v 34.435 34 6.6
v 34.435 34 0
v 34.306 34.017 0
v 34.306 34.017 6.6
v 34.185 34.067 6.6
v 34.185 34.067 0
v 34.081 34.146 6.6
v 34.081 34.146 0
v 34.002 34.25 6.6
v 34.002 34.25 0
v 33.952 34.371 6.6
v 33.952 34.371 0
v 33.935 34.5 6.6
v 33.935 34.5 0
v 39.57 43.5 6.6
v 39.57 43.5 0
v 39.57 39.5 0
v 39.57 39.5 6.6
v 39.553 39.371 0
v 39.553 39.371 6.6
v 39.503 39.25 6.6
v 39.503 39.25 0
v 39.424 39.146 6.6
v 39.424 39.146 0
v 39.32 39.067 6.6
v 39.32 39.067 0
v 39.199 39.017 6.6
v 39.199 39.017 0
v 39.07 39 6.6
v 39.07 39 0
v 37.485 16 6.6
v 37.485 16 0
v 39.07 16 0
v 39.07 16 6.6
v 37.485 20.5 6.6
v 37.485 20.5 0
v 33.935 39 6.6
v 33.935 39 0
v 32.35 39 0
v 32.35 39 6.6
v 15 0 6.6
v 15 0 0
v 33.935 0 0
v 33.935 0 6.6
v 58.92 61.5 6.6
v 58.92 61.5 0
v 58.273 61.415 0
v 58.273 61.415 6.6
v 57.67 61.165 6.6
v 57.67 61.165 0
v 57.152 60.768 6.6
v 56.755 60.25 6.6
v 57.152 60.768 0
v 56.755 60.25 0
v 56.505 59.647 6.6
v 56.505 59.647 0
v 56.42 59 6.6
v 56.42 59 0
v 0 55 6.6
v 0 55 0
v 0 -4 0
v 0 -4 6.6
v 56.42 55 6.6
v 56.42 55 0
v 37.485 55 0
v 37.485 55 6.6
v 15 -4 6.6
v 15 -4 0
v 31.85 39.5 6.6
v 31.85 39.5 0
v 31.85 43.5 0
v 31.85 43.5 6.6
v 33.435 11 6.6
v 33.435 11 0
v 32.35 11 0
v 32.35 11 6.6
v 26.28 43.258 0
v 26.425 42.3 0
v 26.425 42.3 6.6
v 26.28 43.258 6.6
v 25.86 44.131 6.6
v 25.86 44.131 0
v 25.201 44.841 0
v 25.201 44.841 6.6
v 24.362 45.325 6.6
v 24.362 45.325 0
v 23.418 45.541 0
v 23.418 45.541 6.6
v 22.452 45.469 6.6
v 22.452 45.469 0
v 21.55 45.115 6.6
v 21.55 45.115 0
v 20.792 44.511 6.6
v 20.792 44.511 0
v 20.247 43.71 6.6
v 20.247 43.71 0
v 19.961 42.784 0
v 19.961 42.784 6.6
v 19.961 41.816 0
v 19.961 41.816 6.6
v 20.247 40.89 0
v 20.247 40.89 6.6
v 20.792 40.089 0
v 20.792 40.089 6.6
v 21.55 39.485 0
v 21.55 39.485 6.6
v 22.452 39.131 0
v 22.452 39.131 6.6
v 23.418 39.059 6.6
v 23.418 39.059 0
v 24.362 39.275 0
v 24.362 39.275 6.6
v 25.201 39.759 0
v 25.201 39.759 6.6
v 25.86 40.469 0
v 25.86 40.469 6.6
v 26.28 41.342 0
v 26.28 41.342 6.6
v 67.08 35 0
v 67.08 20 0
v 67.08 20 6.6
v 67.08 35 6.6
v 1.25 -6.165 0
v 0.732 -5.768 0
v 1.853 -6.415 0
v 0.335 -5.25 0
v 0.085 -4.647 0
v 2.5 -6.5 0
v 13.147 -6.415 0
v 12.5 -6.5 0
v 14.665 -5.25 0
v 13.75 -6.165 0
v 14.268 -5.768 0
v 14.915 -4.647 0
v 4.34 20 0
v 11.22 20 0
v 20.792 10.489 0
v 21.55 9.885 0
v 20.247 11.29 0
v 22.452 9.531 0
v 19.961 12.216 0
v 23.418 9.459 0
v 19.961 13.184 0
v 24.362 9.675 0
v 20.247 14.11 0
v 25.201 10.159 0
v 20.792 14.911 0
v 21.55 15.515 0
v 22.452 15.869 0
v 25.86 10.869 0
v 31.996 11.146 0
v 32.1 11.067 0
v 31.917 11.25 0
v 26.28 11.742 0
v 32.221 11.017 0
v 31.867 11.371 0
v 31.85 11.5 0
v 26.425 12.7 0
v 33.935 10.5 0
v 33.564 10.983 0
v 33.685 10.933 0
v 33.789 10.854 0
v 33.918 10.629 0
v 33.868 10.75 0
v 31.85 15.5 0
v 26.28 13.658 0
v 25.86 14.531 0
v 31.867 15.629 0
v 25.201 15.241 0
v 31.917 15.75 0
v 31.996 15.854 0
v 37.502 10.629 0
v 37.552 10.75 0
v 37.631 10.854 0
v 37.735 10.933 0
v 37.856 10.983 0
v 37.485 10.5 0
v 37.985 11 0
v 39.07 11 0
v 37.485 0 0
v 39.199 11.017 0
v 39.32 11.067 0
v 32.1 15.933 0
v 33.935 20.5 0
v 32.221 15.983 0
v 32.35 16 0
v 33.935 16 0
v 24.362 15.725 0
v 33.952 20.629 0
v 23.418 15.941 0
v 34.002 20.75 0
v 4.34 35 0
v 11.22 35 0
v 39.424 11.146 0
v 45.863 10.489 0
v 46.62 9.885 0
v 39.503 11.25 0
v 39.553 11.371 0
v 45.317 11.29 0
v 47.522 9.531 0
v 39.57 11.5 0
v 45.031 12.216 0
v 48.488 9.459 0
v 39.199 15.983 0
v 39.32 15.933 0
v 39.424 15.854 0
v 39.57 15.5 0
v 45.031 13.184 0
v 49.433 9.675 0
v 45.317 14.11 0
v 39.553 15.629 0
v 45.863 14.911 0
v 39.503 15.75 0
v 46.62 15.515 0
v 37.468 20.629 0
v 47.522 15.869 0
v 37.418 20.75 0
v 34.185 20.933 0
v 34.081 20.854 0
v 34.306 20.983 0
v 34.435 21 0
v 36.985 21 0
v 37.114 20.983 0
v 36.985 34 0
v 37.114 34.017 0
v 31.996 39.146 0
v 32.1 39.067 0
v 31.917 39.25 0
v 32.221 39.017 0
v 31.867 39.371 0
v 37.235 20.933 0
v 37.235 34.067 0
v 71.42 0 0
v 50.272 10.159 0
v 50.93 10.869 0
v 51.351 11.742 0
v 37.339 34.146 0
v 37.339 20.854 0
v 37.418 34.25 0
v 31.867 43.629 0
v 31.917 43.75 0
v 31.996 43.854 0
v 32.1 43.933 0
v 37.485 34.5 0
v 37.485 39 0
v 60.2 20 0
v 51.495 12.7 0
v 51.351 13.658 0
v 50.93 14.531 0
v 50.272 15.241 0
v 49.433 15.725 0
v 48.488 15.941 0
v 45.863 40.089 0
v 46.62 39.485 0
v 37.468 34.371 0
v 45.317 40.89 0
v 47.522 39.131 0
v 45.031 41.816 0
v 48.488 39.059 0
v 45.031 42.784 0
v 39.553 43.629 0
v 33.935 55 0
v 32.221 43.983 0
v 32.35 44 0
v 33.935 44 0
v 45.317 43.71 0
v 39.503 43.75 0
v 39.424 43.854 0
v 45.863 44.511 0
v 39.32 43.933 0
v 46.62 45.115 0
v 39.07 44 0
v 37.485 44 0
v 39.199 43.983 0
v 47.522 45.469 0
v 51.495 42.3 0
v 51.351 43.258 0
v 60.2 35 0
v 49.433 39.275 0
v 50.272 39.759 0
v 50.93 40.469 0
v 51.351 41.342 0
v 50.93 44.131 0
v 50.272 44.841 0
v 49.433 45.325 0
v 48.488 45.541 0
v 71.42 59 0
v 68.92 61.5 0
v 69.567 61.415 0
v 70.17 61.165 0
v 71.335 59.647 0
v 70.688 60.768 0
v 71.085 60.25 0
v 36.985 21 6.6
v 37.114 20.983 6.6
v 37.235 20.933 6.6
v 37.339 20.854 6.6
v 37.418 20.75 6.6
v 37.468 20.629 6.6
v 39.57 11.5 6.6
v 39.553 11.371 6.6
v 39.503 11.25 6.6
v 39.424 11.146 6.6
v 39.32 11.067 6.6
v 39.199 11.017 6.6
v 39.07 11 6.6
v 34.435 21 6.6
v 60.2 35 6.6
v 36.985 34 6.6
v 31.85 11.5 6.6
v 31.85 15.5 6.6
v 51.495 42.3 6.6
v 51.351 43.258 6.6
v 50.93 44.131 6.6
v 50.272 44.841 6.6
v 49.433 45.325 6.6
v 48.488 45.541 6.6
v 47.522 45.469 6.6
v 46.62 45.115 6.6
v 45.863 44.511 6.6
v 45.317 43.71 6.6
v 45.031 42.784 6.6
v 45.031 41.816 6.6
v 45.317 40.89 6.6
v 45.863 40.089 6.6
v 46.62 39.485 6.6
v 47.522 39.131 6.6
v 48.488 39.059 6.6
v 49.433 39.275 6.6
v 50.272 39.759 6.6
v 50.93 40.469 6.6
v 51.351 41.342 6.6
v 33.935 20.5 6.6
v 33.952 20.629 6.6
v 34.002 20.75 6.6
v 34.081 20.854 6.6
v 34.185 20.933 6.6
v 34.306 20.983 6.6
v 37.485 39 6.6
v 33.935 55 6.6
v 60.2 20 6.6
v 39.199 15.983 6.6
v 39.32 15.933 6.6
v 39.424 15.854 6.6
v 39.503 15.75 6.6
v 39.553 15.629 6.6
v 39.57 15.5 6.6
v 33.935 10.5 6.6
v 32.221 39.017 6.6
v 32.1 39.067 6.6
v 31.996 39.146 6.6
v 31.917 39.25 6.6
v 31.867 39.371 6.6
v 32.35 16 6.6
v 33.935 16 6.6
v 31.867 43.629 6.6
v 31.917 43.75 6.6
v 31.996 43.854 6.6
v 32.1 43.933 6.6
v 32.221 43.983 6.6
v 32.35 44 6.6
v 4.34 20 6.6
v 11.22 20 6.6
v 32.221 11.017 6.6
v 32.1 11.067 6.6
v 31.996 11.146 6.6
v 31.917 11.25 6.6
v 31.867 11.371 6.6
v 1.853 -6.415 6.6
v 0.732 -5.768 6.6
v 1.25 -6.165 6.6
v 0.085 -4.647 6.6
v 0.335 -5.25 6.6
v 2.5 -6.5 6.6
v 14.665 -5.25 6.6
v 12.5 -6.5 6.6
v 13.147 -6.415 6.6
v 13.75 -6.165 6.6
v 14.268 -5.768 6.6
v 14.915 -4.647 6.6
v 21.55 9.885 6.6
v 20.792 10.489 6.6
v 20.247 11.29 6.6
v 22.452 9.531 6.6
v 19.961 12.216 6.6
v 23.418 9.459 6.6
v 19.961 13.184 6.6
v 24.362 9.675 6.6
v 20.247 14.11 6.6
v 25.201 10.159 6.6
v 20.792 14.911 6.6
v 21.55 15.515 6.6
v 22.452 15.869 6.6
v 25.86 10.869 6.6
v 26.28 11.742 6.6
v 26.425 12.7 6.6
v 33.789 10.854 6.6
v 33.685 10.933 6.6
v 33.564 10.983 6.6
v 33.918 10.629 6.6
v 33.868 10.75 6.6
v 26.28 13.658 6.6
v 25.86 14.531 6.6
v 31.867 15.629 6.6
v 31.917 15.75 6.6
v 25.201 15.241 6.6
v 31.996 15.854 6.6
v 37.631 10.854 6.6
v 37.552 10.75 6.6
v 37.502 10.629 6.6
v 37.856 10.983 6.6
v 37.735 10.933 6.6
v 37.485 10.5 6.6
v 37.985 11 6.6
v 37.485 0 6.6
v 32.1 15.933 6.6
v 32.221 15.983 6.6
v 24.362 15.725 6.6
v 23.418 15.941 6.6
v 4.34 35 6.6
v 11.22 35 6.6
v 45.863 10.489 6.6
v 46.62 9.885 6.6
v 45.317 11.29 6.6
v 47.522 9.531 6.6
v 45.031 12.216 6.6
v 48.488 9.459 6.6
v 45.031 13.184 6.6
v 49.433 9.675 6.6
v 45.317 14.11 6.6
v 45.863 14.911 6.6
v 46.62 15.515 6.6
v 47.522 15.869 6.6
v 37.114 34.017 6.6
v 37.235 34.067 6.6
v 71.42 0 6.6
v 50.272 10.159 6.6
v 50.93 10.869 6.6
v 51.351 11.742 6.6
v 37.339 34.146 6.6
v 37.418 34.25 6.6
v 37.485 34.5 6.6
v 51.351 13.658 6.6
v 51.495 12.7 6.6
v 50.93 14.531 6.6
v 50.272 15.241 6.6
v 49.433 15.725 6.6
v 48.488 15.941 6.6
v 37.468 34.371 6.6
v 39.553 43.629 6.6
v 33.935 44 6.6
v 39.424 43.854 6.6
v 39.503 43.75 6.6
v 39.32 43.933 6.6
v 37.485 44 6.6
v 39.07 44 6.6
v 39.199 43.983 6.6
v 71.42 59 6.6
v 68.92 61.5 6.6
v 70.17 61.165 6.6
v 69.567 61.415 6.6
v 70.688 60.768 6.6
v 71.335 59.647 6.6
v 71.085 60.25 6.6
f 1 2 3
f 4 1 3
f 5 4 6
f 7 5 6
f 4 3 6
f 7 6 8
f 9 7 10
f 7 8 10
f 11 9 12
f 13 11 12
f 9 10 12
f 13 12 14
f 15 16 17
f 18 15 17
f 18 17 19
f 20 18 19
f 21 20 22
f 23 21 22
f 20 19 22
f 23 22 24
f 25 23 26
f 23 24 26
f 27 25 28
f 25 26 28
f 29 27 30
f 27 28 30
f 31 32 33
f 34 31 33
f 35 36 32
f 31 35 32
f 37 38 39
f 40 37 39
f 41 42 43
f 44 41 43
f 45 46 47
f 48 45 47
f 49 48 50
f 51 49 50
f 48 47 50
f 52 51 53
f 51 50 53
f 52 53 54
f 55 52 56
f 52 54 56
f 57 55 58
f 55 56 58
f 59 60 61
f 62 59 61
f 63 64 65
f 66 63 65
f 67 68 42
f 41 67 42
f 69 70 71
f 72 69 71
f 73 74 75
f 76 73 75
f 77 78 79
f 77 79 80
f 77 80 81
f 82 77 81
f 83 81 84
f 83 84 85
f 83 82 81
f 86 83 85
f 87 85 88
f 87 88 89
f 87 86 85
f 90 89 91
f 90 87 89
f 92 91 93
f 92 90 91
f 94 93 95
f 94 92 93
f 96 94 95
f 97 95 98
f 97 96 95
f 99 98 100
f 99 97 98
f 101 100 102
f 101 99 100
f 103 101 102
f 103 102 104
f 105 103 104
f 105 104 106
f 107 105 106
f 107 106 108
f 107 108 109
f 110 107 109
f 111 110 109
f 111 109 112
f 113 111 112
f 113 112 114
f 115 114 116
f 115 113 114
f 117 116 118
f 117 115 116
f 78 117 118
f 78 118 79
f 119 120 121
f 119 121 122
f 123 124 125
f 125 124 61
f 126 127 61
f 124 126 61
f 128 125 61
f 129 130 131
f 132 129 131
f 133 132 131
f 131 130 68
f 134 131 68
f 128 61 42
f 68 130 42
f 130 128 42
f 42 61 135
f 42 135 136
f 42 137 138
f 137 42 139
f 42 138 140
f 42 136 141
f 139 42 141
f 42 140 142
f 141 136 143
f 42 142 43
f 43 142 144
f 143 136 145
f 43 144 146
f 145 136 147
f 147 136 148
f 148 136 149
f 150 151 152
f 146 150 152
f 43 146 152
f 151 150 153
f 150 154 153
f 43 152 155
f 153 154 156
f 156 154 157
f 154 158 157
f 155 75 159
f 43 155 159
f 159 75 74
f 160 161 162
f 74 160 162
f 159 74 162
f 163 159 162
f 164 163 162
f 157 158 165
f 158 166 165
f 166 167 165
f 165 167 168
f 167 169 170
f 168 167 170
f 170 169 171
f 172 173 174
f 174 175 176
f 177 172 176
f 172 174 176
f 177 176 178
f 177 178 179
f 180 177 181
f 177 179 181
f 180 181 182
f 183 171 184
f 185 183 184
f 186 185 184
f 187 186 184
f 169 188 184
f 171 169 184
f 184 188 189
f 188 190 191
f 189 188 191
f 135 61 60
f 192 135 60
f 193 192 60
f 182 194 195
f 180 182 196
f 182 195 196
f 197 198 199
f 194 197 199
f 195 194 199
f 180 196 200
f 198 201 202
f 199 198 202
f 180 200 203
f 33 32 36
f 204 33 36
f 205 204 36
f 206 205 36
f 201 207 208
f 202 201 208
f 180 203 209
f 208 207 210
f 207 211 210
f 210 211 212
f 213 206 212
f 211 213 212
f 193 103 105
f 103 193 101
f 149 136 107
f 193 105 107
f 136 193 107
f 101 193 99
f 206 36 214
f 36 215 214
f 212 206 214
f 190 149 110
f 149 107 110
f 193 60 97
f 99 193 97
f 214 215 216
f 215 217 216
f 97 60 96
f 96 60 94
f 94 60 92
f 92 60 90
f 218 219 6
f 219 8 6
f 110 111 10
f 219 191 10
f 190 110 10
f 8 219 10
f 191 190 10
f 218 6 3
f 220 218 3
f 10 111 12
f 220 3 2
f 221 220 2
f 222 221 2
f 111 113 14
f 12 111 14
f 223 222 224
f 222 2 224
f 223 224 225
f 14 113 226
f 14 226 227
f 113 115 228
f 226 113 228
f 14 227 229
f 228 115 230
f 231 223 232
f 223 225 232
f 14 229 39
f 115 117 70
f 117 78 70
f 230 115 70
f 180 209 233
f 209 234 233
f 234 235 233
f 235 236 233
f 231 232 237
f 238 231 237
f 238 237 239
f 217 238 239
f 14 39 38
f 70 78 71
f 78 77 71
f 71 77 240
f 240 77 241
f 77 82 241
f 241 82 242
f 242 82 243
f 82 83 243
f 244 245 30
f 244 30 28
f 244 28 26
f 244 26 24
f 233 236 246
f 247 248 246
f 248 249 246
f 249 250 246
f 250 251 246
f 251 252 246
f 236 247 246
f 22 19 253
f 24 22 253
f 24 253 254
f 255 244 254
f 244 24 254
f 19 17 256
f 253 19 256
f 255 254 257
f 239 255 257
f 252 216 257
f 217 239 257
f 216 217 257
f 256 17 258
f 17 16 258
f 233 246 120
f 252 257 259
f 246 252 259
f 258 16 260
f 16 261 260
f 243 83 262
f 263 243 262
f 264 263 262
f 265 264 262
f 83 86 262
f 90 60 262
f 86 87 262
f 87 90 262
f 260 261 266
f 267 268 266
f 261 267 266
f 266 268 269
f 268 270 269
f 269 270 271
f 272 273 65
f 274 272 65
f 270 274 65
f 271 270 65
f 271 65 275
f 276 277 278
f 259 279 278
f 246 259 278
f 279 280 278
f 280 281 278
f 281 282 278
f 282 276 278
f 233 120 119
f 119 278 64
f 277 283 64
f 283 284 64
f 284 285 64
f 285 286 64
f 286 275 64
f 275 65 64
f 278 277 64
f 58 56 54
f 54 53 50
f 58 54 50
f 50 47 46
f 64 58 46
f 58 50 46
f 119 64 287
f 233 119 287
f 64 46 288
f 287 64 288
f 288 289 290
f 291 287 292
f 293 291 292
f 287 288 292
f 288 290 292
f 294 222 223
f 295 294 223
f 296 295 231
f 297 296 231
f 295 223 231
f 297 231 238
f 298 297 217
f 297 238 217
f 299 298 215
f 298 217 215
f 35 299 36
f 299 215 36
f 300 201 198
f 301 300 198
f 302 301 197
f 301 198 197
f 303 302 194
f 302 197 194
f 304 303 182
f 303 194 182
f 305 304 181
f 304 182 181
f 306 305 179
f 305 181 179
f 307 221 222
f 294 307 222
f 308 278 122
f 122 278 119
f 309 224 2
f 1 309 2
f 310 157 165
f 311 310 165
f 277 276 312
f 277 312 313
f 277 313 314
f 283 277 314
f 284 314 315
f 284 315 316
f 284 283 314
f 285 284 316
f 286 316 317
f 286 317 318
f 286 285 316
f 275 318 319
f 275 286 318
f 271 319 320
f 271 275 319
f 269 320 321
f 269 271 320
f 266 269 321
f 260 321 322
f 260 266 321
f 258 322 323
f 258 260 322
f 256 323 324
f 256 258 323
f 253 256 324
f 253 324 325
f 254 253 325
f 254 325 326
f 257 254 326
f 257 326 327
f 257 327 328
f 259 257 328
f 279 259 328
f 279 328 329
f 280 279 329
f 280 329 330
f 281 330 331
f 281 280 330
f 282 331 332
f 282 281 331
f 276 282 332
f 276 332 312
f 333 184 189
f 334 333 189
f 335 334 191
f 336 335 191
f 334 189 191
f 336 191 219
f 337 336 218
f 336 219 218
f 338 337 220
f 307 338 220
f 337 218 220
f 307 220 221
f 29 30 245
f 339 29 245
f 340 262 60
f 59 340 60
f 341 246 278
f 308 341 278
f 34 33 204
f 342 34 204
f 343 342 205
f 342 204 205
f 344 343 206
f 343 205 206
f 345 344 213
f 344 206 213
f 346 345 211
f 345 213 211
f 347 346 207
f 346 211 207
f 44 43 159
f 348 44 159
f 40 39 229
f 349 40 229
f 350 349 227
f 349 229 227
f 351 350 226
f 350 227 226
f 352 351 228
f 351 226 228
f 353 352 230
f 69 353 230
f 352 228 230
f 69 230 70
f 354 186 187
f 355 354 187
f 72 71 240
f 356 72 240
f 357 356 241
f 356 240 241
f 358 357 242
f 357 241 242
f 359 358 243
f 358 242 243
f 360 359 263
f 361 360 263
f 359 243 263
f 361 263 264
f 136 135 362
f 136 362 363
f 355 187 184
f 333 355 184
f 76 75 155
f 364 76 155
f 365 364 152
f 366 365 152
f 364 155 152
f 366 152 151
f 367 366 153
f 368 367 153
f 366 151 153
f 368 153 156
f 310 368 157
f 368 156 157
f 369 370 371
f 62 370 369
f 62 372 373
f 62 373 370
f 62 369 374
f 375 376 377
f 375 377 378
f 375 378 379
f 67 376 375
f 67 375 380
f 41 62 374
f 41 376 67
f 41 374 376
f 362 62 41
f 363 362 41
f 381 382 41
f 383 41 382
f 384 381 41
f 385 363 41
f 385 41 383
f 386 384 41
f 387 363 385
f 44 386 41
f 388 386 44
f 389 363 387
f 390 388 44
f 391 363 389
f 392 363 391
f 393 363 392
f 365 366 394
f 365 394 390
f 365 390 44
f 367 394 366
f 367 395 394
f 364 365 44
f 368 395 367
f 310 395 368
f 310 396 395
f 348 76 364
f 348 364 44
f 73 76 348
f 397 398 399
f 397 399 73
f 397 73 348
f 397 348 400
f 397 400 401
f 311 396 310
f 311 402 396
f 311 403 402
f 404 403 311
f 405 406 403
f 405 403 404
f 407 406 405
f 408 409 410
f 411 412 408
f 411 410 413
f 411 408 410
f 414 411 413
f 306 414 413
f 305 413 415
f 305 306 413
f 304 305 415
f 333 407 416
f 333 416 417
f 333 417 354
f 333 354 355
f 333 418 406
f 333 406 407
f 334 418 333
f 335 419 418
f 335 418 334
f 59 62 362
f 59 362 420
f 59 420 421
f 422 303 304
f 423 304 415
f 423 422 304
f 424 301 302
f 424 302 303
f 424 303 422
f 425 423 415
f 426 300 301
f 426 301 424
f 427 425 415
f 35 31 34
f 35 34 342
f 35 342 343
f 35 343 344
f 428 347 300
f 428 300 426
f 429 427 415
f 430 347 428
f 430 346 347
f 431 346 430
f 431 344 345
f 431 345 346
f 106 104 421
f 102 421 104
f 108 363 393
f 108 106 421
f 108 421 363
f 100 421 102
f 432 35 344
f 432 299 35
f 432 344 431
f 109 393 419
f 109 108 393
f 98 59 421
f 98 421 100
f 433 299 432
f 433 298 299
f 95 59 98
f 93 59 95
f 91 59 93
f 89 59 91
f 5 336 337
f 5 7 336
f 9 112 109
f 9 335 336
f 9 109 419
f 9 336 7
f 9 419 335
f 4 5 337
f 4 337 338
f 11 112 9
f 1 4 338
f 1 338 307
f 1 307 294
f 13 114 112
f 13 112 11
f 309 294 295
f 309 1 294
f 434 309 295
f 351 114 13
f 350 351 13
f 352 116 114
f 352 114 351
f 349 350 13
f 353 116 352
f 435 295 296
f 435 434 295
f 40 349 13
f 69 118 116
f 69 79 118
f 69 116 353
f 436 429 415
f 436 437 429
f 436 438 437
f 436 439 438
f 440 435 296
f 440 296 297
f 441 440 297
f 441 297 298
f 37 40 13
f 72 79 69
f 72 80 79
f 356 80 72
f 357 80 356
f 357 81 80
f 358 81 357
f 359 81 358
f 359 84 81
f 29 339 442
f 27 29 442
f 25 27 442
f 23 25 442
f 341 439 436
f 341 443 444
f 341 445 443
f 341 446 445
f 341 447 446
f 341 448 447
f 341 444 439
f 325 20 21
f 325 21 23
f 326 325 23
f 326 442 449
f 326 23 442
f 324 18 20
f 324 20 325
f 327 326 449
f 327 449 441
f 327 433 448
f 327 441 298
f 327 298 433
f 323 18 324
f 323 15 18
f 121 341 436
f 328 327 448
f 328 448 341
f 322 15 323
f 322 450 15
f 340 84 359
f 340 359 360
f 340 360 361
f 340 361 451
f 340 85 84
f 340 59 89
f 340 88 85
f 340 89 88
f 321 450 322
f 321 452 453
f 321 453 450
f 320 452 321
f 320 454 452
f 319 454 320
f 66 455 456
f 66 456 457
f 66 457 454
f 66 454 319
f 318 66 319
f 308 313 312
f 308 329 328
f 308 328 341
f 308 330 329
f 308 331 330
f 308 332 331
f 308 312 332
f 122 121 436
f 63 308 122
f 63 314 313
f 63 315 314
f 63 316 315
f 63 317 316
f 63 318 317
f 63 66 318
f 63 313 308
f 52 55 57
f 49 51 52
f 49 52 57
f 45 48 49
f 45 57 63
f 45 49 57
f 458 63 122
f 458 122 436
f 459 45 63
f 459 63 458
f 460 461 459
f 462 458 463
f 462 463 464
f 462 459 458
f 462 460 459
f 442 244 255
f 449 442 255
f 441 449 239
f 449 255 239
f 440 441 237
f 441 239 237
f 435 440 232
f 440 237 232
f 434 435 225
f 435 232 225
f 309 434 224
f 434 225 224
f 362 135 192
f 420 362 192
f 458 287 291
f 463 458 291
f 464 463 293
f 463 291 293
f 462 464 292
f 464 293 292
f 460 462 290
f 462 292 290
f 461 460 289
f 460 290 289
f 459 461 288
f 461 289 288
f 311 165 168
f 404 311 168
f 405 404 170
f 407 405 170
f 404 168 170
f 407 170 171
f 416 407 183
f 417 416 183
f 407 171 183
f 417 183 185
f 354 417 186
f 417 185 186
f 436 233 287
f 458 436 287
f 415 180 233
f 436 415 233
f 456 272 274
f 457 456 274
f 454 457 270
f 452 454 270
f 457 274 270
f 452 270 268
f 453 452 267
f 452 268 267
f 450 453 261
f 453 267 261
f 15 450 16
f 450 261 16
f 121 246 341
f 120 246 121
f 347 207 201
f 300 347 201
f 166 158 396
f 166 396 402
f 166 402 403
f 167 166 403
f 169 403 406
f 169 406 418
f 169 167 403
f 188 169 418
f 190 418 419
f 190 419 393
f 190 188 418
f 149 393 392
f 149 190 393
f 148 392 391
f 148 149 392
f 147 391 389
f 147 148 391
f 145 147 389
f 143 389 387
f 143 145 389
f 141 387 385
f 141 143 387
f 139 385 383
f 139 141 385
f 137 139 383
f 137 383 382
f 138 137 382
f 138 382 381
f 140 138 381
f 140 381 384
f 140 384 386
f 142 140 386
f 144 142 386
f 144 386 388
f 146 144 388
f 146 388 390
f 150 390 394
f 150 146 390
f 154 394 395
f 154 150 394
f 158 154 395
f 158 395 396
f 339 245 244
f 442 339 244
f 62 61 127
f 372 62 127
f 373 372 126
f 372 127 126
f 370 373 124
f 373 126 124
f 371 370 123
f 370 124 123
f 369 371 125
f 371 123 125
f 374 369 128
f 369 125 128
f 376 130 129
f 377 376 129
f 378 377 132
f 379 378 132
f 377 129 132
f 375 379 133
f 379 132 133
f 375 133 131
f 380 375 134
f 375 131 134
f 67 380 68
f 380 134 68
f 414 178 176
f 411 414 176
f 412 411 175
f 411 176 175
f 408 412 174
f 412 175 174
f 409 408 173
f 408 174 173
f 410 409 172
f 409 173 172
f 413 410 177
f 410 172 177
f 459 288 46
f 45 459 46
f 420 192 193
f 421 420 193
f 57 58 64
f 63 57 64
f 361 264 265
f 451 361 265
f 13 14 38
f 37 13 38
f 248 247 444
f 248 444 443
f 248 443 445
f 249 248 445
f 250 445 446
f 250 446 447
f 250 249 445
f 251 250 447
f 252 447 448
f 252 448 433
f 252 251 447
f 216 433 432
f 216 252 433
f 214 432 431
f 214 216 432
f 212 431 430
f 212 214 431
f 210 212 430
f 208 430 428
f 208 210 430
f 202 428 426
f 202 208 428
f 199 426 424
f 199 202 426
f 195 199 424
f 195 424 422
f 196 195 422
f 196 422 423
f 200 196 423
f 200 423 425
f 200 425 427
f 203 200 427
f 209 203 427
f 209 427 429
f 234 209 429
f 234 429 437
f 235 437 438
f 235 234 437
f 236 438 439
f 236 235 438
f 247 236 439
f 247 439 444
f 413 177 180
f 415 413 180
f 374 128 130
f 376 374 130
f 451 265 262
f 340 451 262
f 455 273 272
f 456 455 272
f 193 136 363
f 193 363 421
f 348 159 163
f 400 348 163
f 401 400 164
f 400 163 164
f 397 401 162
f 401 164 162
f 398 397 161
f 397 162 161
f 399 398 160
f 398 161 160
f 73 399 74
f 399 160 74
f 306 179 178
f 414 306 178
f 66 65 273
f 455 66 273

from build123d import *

# Parameters (mm, degrees)
MODEL_R             = 3.25
MODEL_W             = 6.88
MODEL_H             = 15
BOSS_EXTRUDE1_DEPTH = 6.6


with BuildPart() as part:
    # Model → Boss-Extrude1 (new body)
    with BuildSketch(Plane.XY):
        with BuildLine():
            Line((39.57, 15.5), (39.57, 11.5))
            ThreePointArc((39.57, 11.5), (39.423553391, 11.146446609), (39.07, 11))
            Line((39.07, 11), (37.985, 11))
            ThreePointArc((37.985, 11), (37.631446609, 10.853553391), (37.485, 10.5))
            Line((37.485, 10.5), (37.485, 0))
            Line((37.485, 0), (71.42, 0))
            Line((71.42, 0), (71.42, 59))
            ThreePointArc((71.42, 59), (70.687766953, 60.767766953), (68.92, 61.5))
            Line((68.92, 61.5), (58.92, 61.5))
            ThreePointArc((58.92, 61.5), (57.152233047, 60.767766953), (56.42, 59))
            Line((56.42, 59), (56.42, 55))
            Line((56.42, 55), (37.485, 55))
            Line((37.485, 55), (37.485, 44))
            Line((37.485, 44), (39.07, 44))
            ThreePointArc((39.07, 44), (39.423553391, 43.853553391), (39.57, 43.5))
            Line((39.57, 43.5), (39.57, 39.5))
            ThreePointArc((39.57, 39.5), (39.423553391, 39.146446609), (39.07, 39))
            Line((39.07, 39), (37.485, 39))
            Line((37.485, 39), (37.485, 34.5))
            ThreePointArc((37.485, 34.5), (37.338553391, 34.146446609), (36.985, 34))
            Line((36.985, 34), (34.435, 34))
            ThreePointArc((34.435, 34), (34.081446609, 34.146446609), (33.935, 34.5))
            Line((33.935, 34.5), (33.935, 39))
            Line((33.935, 39), (32.35, 39))
            ThreePointArc((32.35, 39), (31.996446609, 39.146446609), (31.85, 39.5))
            Line((31.85, 39.5), (31.85, 43.5))
            ThreePointArc((31.85, 43.5), (31.996446609, 43.853553391), (32.35, 44))
            Line((32.35, 44), (33.935, 44))
            Line((33.935, 44), (33.935, 55))
            Line((33.935, 55), (0, 55))
            Line((0, 55), (0, -4))
            ThreePointArc((0, -4), (0.732233047, -5.767766953), (2.5, -6.5))
            Line((2.5, -6.5), (12.5, -6.5))
            ThreePointArc((12.5, -6.5), (14.267766953, -5.767766953), (15, -4))
            Line((15, -4), (15, 0))
            Line((15, 0), (33.935, 0))
            Line((33.935, 0), (33.935, 10.5))
            ThreePointArc((33.935, 10.5), (33.788553391, 10.853553391), (33.435, 11))
            Line((33.435, 11), (32.35, 11))
            ThreePointArc((32.35, 11), (31.996446609, 11.146446609), (31.85, 11.5))
            Line((31.85, 11.5), (31.85, 15.5))
            ThreePointArc((31.85, 15.5), (31.996446609, 15.853553391), (32.35, 16))
            Line((32.35, 16), (33.935, 16))
            Line((33.935, 16), (33.935, 20.5))
            ThreePointArc((33.935, 20.5), (34.081446609, 20.853553391), (34.435, 21))
            Line((34.435, 21), (36.985, 21))
            ThreePointArc((36.985, 21), (37.338553391, 20.853553391), (37.485, 20.5))
            Line((37.485, 20.5), (37.485, 16))
            Line((37.485, 16), (39.07, 16))
            ThreePointArc((39.07, 16), (39.423553391, 15.853553391), (39.57, 15.5))
        make_face()
        with Locations((23.174807377, 12.7)):
            Circle(MODEL_R, mode=Mode.SUBTRACT)
        with Locations((23.174807377, 42.3)):
            Circle(MODEL_R, mode=Mode.SUBTRACT)
        with Locations((48.245192623, 12.7)):
            Circle(MODEL_R, mode=Mode.SUBTRACT)
        with Locations((48.245192623, 42.3)):
            Circle(MODEL_R, mode=Mode.SUBTRACT)
        with Locations((7.78, 27.5)):
            Rectangle(MODEL_W, MODEL_H, mode=Mode.SUBTRACT)
        with Locations((63.64, 27.5)):
            Rectangle(MODEL_W, MODEL_H, mode=Mode.SUBTRACT)
    extrude(amount=BOSS_EXTRUDE1_DEPTH)


solid = part.part
